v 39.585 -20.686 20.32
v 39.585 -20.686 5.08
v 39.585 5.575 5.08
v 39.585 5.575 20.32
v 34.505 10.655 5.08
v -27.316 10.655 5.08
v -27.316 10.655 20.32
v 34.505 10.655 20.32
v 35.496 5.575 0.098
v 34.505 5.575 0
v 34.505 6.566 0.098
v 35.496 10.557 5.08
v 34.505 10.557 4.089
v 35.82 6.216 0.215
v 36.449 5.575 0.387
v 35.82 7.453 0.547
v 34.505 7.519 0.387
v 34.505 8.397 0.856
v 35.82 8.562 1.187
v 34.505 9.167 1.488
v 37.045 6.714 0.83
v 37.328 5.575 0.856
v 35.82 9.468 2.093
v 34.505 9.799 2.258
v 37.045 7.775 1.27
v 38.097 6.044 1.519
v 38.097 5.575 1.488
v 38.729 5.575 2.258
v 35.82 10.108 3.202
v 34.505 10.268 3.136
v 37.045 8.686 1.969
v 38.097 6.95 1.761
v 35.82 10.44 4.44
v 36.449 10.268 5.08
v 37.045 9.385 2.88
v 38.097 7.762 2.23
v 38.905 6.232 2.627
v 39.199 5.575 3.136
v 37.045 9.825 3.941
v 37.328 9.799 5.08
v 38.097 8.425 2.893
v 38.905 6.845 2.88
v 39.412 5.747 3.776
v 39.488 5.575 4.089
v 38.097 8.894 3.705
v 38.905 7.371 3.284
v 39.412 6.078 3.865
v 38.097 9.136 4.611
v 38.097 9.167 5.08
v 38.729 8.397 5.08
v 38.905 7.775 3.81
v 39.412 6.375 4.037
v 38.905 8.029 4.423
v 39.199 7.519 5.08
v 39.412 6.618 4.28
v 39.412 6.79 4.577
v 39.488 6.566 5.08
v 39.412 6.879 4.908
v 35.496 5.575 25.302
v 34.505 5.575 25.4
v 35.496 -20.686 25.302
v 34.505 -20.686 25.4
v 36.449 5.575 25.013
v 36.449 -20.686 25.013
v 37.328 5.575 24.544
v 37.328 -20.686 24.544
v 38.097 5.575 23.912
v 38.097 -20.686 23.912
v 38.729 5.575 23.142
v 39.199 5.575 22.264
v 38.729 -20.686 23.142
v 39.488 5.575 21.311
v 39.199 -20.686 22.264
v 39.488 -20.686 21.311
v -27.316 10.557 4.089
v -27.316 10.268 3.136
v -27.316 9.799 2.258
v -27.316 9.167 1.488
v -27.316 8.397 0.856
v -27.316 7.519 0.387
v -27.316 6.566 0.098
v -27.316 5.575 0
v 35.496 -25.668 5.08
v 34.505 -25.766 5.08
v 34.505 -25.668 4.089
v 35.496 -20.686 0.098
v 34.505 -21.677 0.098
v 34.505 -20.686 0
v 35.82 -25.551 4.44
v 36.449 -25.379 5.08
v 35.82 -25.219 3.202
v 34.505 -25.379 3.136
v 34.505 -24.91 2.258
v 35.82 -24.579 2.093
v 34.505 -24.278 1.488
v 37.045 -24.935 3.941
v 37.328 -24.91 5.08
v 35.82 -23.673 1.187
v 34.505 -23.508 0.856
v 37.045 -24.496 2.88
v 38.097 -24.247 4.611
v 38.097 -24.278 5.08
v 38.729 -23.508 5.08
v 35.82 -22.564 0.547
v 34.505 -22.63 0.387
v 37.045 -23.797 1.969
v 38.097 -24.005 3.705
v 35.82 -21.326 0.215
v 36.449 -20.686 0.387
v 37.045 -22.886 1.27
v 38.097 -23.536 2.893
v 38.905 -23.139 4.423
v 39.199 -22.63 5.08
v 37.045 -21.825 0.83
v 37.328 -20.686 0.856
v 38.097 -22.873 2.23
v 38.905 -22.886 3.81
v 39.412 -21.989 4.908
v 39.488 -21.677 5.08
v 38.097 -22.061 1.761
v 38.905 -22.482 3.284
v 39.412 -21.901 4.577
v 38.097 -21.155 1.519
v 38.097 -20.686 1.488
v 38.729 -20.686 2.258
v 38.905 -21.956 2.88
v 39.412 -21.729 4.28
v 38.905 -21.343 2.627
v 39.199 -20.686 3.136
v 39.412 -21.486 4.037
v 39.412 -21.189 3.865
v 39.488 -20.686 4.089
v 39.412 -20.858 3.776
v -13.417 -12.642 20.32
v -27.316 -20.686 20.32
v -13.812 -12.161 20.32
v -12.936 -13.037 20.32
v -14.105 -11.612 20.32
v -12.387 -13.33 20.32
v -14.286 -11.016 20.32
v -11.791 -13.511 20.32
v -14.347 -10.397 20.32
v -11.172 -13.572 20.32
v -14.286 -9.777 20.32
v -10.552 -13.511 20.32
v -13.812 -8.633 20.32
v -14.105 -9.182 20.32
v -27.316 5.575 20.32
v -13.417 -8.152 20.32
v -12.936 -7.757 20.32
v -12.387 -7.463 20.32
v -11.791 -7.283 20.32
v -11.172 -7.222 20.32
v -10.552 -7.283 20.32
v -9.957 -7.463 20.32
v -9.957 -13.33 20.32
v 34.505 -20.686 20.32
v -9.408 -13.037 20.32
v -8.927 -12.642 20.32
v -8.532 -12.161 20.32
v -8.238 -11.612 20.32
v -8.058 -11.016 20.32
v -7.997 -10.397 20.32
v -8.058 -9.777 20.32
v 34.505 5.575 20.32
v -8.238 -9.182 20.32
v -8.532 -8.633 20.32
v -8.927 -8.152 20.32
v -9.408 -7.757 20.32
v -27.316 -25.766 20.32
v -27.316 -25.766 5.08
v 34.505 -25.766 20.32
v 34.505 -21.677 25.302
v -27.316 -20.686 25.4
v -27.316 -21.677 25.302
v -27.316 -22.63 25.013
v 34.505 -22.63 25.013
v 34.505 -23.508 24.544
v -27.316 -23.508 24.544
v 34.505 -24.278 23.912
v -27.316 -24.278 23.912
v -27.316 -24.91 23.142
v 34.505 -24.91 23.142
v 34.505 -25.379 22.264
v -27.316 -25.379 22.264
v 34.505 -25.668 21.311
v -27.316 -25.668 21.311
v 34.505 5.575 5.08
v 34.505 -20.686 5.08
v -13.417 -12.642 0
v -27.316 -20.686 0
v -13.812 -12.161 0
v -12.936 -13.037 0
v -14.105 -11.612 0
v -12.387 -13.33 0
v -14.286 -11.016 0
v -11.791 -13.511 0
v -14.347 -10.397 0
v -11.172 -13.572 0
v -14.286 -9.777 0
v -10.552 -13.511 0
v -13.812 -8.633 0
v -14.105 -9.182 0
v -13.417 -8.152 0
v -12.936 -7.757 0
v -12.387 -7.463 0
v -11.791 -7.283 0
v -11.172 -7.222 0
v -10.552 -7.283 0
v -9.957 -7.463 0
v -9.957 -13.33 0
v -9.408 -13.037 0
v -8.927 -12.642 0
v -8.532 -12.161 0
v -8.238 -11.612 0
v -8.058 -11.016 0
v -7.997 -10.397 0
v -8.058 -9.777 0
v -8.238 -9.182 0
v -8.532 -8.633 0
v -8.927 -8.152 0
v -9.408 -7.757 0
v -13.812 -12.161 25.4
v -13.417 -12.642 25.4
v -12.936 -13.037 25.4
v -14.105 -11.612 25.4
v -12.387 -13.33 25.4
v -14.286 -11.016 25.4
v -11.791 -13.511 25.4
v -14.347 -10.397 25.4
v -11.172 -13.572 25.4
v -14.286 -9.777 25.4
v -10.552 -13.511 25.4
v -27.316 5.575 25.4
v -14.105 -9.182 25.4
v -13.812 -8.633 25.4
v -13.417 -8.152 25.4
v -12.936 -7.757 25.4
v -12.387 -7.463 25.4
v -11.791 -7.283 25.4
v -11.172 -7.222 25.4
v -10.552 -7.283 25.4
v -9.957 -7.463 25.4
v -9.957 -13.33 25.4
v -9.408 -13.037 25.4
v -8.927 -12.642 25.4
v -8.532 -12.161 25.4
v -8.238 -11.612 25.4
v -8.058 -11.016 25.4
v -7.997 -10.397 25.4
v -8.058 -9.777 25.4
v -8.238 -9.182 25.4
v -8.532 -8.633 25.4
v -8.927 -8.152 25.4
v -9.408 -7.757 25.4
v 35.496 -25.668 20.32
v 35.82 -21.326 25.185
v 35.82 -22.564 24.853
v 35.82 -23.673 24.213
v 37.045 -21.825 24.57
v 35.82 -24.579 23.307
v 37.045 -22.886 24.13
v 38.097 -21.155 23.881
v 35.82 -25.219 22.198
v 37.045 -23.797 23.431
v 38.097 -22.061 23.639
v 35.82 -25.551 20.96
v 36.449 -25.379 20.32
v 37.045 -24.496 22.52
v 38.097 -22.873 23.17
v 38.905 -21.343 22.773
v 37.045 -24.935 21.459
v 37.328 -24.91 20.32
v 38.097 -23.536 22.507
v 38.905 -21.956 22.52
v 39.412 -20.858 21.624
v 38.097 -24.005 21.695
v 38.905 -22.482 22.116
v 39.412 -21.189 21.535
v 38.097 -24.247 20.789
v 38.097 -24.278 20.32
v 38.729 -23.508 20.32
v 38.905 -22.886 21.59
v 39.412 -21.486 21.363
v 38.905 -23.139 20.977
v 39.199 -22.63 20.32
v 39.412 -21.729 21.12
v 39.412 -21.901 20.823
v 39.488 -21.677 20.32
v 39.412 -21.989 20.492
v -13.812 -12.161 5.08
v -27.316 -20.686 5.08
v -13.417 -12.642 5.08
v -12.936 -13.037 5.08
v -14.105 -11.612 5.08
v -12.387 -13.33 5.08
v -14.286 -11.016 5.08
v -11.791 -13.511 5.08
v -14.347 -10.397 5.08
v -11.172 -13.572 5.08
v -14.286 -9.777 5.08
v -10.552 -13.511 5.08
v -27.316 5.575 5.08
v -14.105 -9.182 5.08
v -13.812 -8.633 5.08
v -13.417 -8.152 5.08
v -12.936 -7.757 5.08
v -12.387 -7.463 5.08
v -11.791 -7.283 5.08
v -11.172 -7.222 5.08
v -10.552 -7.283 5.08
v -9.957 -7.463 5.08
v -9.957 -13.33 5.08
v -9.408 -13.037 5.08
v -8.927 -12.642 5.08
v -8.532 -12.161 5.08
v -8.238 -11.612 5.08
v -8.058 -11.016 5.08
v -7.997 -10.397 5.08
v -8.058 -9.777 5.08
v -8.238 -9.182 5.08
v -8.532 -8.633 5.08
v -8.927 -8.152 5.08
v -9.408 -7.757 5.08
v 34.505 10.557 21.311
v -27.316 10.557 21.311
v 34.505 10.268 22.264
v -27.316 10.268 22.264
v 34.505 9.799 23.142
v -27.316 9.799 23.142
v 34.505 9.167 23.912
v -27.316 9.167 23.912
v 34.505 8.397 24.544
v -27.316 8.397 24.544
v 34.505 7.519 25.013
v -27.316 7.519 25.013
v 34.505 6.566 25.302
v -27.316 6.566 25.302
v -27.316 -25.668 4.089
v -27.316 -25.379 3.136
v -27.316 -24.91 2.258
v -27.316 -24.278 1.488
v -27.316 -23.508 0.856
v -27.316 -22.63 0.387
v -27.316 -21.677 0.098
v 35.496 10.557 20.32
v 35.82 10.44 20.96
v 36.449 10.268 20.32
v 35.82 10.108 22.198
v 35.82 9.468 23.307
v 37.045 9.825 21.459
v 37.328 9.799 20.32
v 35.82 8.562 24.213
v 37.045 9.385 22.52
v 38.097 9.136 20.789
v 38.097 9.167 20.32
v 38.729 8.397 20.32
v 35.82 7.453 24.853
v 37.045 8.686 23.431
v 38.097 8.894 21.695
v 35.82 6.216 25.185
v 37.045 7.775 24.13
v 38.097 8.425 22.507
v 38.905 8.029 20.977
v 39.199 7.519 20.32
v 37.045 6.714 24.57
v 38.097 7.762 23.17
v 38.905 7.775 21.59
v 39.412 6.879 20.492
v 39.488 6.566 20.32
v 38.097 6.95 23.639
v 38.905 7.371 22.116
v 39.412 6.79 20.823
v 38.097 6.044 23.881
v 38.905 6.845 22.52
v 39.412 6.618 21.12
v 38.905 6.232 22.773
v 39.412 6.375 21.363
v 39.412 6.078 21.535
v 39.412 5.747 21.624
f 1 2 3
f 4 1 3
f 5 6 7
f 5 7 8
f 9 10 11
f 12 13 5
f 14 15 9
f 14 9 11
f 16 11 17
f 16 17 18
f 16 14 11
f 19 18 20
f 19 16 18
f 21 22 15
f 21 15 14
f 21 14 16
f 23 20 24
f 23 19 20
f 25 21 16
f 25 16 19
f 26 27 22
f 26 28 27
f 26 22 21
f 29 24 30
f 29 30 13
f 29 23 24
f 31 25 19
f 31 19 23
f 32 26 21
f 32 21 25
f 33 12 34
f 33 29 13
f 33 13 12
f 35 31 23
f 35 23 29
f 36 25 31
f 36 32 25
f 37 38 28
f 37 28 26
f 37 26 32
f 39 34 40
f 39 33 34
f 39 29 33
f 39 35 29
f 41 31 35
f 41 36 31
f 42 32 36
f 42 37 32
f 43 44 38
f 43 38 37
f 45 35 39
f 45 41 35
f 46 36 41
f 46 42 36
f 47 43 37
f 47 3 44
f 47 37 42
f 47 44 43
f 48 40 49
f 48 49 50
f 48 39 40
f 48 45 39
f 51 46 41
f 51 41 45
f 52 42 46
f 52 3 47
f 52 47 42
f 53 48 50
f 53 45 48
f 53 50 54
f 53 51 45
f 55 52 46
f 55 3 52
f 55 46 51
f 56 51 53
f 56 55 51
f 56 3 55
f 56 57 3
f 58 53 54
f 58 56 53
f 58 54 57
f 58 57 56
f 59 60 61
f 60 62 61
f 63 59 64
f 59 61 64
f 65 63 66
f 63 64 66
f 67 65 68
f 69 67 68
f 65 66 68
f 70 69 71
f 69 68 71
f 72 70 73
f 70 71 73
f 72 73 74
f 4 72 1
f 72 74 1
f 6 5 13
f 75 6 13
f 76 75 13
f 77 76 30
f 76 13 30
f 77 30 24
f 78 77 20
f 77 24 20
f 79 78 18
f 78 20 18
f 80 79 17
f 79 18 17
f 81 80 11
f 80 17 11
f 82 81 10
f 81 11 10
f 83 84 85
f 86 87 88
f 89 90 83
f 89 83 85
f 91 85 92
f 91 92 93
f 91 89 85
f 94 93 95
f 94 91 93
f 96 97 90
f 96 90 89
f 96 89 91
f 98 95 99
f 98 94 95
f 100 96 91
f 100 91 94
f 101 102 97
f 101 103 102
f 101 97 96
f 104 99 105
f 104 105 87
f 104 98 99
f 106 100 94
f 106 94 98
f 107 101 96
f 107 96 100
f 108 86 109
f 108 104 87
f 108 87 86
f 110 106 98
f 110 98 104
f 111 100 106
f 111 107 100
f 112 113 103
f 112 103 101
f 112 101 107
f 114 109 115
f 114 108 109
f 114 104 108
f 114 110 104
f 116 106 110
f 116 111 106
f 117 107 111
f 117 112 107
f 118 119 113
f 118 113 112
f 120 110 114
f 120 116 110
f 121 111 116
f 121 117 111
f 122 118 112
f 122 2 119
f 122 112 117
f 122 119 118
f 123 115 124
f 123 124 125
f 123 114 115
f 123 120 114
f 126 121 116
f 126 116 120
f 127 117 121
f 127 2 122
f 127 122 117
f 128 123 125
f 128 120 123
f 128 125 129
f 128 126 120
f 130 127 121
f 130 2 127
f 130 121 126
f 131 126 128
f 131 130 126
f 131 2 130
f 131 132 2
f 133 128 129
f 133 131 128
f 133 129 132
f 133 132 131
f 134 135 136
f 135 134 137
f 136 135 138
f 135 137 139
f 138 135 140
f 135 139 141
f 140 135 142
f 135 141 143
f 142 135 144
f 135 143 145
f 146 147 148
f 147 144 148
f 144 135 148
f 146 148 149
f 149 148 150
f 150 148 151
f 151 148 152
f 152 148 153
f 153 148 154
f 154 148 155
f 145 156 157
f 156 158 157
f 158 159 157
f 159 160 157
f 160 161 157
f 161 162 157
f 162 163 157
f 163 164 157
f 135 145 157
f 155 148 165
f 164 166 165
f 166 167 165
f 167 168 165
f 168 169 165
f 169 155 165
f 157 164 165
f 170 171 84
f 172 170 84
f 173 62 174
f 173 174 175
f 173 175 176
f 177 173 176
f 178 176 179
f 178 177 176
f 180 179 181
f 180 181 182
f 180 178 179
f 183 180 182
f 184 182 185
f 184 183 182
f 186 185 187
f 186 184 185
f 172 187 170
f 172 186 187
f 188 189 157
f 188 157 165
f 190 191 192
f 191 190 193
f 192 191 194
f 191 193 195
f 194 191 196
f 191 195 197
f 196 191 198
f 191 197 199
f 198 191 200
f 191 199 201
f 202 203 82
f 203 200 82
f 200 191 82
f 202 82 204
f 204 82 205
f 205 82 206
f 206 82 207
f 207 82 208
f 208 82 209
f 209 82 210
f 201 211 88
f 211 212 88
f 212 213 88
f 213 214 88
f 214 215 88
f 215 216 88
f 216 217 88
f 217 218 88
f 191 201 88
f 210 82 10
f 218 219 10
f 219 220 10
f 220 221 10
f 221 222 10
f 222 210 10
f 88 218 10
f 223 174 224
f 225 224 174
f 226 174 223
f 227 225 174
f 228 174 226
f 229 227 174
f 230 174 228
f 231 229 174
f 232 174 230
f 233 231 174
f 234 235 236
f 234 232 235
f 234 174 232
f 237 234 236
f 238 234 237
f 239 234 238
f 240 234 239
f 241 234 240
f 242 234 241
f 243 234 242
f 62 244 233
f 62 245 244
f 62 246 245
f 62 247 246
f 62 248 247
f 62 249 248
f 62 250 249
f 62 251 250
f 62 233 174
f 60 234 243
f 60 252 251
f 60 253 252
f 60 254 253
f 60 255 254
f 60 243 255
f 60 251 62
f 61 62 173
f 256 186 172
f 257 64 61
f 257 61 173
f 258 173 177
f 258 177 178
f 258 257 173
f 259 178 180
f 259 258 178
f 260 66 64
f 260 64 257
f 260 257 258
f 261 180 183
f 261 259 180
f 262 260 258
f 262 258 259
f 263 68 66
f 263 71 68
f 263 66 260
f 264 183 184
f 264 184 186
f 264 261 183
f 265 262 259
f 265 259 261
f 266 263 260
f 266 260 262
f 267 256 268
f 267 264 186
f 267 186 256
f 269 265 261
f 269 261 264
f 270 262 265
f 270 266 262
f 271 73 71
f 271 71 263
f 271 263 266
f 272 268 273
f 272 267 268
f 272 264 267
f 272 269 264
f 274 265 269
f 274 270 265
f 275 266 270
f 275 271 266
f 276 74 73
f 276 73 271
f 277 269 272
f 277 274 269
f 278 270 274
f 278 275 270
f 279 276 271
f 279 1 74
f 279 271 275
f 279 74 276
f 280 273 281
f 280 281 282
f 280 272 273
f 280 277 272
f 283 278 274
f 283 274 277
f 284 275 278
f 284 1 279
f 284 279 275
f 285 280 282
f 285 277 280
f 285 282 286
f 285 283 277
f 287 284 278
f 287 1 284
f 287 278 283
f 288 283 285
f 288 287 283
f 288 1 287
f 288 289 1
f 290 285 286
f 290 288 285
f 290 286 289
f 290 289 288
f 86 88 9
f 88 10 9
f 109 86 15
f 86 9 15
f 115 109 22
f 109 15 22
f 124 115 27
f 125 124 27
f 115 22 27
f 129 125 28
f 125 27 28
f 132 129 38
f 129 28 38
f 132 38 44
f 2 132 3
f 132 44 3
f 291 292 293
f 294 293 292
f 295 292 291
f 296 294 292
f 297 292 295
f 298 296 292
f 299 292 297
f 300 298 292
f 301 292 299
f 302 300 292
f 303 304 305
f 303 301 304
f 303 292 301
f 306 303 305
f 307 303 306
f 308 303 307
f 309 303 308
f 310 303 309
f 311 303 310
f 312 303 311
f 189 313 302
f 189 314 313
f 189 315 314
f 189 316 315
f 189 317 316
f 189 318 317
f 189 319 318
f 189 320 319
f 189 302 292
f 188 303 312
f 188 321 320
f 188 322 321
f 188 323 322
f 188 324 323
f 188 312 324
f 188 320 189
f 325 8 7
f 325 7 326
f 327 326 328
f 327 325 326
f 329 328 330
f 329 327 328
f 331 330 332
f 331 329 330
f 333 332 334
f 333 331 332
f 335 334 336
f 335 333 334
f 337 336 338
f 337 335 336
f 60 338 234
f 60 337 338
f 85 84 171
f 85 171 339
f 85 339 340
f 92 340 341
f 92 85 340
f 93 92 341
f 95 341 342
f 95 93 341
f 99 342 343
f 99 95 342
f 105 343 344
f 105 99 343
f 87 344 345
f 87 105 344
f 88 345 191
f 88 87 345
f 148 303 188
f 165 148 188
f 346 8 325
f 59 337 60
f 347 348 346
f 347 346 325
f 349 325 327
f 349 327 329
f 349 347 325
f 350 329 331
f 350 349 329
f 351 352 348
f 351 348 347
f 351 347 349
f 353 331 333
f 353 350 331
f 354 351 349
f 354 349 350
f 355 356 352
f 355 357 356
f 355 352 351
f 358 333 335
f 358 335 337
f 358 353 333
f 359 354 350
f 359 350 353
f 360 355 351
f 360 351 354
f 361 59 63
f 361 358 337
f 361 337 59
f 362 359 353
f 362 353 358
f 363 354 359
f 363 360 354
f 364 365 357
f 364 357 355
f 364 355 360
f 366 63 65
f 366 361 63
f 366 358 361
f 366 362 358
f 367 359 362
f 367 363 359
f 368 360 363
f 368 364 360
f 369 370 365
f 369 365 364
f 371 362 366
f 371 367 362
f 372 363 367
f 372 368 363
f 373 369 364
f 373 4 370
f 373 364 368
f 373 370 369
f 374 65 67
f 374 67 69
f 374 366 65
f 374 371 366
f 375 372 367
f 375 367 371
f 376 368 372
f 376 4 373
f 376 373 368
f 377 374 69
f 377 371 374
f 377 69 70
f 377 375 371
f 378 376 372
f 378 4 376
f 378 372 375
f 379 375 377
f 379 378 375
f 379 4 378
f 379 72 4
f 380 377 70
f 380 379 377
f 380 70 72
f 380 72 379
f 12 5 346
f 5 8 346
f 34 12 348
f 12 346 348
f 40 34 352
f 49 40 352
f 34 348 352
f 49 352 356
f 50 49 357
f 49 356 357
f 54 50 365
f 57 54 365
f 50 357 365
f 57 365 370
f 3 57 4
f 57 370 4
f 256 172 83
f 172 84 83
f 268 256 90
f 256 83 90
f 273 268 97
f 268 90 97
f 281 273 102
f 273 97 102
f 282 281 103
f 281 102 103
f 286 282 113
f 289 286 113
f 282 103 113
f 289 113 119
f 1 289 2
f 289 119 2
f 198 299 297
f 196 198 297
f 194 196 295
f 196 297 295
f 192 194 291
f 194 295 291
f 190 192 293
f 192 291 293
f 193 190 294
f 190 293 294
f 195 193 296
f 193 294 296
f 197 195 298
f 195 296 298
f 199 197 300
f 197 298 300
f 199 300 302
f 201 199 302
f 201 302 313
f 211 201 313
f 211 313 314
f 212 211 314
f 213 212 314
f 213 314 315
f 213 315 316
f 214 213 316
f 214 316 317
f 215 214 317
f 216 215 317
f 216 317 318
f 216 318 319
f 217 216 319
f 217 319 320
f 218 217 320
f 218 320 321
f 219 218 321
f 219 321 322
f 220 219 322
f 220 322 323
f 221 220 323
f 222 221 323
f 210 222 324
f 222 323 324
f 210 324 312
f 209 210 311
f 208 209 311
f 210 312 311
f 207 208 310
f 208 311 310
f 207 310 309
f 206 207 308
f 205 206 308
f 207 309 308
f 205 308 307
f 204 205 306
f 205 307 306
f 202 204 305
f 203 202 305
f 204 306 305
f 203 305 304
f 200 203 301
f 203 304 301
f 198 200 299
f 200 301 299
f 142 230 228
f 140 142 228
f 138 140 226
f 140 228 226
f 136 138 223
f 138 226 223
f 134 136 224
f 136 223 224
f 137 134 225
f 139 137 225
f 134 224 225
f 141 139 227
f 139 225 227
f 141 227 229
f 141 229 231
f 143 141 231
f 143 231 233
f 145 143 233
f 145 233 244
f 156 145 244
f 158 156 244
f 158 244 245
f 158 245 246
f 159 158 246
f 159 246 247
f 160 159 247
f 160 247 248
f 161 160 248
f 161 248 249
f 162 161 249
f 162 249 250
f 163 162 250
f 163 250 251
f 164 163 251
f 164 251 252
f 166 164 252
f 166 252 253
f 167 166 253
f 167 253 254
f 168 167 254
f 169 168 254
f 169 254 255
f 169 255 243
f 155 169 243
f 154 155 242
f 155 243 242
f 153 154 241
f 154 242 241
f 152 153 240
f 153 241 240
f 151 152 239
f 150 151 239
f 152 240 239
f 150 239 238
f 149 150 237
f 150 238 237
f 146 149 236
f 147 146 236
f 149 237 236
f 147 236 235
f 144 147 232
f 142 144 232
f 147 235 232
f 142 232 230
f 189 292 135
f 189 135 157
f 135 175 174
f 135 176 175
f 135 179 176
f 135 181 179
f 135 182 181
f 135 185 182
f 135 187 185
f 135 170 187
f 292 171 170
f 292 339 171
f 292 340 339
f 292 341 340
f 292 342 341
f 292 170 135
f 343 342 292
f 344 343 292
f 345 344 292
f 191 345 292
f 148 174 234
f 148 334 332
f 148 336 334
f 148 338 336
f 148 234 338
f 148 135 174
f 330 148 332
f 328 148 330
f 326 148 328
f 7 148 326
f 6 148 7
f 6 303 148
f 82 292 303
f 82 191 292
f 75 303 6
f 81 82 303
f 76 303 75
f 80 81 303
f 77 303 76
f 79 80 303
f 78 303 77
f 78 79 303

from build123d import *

# Parameters (mm, degrees)
F0_W     = 66.9010188431
F0_H     = 36.4210186526
F1_DEPTH = 25.4
F2_R     = 5.08
F3_R     = 5.08
F4_R     = 5.08
F5_R     = 5.08
F6_R     = 5.08
F7_T     = 5.08
F9_D     = 6.35


# Not quite as in the source:
# - a shell that OpenCascade refuses in one call is made with other operations: the cavity is built on its own and cut out


with BuildPart() as f1:
    # F0 (on Top) → F1 (new body)
    with BuildSketch(Plane.XY):
        with Locations((6.1347456649, -7.5554237701)):
            Rectangle(F0_W, F0_H)
    extrude(amount=F1_DEPTH)

    # F2
    f2_edges = [f1.edges().sort_by_distance(p)[0] for p in [
        (6.134746, 10.655086, 25.4),
    ]]
    fillet(f2_edges, radius=F2_R)

    # F3
    f3_edges = [f1.edges().sort_by_distance(p)[0] for p in [
        (6.134746, 10.655086, 0),
    ]]
    fillet(f3_edges, radius=F3_R)

    # F4
    f4_edges = [f1.edges().sort_by_distance(p)[0] for p in [
        (6.134746, -25.765933, 25.4),
    ]]
    fillet(f4_edges, radius=F4_R)

    # F5
    f5_edges = [f1.edges().sort_by_distance(p)[0] for p in [
        (6.134746, -25.765933, 0),
    ]]
    fillet(f5_edges, radius=F5_R)

    # F6
    f6_edges = [f1.edges().sort_by_distance(p)[0] for p in [
        (39.585255, -7.555424, 0),
        (39.585255, 9.167188, 1.487898),
        (39.585255, 9.167188, 23.912102),
        (39.585255, 10.655086, 12.7),
        (39.585255, -7.555424, 25.4),
        (39.585255, -24.278036, 1.487898),
        (39.585255, -25.765933, 12.7),
        (39.585255, -24.278036, 23.912102),
    ]]
    fillet(f6_edges, radius=F6_R)

    # F7: shell of thickness 5.08, made by hand


with BuildPart() as f7_core1:
    # F7_t2: copy of F1
    add(f1.part)

    # the walls: a layer under each face that stays
    f7_faces = [f7_core1.faces().sort_by_distance(p)[0] for p in [
        (39.5852550864, -7.5554237701, 12.7),
        (3.5947456649, -7.5554237701, 0),
        (3.5947456649, -25.7659330964, 12.7),
        (3.5947456649, 10.6550855562, 12.7),
        (3.5947456649, -7.5554237701, 25.4),
    ]]
    thicken(f7_faces, amount=-F7_T, mode=Mode.SUBTRACT)


with BuildPart() as f1_1:
    add(f1.part)

    # what is left inside the walls is the cavity
    f7_cavity = [f7_core1.part.solids().sort_by_distance(p)[0] for p in [
        (3.594746, -11.93226, 5.1308),
    ]]
    add(f7_cavity, mode=Mode.SUBTRACT)

    # F9 (through all)
    with Locations(Plane(origin=(0, 0, 0), x_dir=(1, 0, 0), z_dir=(0, 0, -1))):
        with Locations((-11.171694845, 10.3967795148)):
            Hole(F9_D / 2)


solid = f1_1.part
